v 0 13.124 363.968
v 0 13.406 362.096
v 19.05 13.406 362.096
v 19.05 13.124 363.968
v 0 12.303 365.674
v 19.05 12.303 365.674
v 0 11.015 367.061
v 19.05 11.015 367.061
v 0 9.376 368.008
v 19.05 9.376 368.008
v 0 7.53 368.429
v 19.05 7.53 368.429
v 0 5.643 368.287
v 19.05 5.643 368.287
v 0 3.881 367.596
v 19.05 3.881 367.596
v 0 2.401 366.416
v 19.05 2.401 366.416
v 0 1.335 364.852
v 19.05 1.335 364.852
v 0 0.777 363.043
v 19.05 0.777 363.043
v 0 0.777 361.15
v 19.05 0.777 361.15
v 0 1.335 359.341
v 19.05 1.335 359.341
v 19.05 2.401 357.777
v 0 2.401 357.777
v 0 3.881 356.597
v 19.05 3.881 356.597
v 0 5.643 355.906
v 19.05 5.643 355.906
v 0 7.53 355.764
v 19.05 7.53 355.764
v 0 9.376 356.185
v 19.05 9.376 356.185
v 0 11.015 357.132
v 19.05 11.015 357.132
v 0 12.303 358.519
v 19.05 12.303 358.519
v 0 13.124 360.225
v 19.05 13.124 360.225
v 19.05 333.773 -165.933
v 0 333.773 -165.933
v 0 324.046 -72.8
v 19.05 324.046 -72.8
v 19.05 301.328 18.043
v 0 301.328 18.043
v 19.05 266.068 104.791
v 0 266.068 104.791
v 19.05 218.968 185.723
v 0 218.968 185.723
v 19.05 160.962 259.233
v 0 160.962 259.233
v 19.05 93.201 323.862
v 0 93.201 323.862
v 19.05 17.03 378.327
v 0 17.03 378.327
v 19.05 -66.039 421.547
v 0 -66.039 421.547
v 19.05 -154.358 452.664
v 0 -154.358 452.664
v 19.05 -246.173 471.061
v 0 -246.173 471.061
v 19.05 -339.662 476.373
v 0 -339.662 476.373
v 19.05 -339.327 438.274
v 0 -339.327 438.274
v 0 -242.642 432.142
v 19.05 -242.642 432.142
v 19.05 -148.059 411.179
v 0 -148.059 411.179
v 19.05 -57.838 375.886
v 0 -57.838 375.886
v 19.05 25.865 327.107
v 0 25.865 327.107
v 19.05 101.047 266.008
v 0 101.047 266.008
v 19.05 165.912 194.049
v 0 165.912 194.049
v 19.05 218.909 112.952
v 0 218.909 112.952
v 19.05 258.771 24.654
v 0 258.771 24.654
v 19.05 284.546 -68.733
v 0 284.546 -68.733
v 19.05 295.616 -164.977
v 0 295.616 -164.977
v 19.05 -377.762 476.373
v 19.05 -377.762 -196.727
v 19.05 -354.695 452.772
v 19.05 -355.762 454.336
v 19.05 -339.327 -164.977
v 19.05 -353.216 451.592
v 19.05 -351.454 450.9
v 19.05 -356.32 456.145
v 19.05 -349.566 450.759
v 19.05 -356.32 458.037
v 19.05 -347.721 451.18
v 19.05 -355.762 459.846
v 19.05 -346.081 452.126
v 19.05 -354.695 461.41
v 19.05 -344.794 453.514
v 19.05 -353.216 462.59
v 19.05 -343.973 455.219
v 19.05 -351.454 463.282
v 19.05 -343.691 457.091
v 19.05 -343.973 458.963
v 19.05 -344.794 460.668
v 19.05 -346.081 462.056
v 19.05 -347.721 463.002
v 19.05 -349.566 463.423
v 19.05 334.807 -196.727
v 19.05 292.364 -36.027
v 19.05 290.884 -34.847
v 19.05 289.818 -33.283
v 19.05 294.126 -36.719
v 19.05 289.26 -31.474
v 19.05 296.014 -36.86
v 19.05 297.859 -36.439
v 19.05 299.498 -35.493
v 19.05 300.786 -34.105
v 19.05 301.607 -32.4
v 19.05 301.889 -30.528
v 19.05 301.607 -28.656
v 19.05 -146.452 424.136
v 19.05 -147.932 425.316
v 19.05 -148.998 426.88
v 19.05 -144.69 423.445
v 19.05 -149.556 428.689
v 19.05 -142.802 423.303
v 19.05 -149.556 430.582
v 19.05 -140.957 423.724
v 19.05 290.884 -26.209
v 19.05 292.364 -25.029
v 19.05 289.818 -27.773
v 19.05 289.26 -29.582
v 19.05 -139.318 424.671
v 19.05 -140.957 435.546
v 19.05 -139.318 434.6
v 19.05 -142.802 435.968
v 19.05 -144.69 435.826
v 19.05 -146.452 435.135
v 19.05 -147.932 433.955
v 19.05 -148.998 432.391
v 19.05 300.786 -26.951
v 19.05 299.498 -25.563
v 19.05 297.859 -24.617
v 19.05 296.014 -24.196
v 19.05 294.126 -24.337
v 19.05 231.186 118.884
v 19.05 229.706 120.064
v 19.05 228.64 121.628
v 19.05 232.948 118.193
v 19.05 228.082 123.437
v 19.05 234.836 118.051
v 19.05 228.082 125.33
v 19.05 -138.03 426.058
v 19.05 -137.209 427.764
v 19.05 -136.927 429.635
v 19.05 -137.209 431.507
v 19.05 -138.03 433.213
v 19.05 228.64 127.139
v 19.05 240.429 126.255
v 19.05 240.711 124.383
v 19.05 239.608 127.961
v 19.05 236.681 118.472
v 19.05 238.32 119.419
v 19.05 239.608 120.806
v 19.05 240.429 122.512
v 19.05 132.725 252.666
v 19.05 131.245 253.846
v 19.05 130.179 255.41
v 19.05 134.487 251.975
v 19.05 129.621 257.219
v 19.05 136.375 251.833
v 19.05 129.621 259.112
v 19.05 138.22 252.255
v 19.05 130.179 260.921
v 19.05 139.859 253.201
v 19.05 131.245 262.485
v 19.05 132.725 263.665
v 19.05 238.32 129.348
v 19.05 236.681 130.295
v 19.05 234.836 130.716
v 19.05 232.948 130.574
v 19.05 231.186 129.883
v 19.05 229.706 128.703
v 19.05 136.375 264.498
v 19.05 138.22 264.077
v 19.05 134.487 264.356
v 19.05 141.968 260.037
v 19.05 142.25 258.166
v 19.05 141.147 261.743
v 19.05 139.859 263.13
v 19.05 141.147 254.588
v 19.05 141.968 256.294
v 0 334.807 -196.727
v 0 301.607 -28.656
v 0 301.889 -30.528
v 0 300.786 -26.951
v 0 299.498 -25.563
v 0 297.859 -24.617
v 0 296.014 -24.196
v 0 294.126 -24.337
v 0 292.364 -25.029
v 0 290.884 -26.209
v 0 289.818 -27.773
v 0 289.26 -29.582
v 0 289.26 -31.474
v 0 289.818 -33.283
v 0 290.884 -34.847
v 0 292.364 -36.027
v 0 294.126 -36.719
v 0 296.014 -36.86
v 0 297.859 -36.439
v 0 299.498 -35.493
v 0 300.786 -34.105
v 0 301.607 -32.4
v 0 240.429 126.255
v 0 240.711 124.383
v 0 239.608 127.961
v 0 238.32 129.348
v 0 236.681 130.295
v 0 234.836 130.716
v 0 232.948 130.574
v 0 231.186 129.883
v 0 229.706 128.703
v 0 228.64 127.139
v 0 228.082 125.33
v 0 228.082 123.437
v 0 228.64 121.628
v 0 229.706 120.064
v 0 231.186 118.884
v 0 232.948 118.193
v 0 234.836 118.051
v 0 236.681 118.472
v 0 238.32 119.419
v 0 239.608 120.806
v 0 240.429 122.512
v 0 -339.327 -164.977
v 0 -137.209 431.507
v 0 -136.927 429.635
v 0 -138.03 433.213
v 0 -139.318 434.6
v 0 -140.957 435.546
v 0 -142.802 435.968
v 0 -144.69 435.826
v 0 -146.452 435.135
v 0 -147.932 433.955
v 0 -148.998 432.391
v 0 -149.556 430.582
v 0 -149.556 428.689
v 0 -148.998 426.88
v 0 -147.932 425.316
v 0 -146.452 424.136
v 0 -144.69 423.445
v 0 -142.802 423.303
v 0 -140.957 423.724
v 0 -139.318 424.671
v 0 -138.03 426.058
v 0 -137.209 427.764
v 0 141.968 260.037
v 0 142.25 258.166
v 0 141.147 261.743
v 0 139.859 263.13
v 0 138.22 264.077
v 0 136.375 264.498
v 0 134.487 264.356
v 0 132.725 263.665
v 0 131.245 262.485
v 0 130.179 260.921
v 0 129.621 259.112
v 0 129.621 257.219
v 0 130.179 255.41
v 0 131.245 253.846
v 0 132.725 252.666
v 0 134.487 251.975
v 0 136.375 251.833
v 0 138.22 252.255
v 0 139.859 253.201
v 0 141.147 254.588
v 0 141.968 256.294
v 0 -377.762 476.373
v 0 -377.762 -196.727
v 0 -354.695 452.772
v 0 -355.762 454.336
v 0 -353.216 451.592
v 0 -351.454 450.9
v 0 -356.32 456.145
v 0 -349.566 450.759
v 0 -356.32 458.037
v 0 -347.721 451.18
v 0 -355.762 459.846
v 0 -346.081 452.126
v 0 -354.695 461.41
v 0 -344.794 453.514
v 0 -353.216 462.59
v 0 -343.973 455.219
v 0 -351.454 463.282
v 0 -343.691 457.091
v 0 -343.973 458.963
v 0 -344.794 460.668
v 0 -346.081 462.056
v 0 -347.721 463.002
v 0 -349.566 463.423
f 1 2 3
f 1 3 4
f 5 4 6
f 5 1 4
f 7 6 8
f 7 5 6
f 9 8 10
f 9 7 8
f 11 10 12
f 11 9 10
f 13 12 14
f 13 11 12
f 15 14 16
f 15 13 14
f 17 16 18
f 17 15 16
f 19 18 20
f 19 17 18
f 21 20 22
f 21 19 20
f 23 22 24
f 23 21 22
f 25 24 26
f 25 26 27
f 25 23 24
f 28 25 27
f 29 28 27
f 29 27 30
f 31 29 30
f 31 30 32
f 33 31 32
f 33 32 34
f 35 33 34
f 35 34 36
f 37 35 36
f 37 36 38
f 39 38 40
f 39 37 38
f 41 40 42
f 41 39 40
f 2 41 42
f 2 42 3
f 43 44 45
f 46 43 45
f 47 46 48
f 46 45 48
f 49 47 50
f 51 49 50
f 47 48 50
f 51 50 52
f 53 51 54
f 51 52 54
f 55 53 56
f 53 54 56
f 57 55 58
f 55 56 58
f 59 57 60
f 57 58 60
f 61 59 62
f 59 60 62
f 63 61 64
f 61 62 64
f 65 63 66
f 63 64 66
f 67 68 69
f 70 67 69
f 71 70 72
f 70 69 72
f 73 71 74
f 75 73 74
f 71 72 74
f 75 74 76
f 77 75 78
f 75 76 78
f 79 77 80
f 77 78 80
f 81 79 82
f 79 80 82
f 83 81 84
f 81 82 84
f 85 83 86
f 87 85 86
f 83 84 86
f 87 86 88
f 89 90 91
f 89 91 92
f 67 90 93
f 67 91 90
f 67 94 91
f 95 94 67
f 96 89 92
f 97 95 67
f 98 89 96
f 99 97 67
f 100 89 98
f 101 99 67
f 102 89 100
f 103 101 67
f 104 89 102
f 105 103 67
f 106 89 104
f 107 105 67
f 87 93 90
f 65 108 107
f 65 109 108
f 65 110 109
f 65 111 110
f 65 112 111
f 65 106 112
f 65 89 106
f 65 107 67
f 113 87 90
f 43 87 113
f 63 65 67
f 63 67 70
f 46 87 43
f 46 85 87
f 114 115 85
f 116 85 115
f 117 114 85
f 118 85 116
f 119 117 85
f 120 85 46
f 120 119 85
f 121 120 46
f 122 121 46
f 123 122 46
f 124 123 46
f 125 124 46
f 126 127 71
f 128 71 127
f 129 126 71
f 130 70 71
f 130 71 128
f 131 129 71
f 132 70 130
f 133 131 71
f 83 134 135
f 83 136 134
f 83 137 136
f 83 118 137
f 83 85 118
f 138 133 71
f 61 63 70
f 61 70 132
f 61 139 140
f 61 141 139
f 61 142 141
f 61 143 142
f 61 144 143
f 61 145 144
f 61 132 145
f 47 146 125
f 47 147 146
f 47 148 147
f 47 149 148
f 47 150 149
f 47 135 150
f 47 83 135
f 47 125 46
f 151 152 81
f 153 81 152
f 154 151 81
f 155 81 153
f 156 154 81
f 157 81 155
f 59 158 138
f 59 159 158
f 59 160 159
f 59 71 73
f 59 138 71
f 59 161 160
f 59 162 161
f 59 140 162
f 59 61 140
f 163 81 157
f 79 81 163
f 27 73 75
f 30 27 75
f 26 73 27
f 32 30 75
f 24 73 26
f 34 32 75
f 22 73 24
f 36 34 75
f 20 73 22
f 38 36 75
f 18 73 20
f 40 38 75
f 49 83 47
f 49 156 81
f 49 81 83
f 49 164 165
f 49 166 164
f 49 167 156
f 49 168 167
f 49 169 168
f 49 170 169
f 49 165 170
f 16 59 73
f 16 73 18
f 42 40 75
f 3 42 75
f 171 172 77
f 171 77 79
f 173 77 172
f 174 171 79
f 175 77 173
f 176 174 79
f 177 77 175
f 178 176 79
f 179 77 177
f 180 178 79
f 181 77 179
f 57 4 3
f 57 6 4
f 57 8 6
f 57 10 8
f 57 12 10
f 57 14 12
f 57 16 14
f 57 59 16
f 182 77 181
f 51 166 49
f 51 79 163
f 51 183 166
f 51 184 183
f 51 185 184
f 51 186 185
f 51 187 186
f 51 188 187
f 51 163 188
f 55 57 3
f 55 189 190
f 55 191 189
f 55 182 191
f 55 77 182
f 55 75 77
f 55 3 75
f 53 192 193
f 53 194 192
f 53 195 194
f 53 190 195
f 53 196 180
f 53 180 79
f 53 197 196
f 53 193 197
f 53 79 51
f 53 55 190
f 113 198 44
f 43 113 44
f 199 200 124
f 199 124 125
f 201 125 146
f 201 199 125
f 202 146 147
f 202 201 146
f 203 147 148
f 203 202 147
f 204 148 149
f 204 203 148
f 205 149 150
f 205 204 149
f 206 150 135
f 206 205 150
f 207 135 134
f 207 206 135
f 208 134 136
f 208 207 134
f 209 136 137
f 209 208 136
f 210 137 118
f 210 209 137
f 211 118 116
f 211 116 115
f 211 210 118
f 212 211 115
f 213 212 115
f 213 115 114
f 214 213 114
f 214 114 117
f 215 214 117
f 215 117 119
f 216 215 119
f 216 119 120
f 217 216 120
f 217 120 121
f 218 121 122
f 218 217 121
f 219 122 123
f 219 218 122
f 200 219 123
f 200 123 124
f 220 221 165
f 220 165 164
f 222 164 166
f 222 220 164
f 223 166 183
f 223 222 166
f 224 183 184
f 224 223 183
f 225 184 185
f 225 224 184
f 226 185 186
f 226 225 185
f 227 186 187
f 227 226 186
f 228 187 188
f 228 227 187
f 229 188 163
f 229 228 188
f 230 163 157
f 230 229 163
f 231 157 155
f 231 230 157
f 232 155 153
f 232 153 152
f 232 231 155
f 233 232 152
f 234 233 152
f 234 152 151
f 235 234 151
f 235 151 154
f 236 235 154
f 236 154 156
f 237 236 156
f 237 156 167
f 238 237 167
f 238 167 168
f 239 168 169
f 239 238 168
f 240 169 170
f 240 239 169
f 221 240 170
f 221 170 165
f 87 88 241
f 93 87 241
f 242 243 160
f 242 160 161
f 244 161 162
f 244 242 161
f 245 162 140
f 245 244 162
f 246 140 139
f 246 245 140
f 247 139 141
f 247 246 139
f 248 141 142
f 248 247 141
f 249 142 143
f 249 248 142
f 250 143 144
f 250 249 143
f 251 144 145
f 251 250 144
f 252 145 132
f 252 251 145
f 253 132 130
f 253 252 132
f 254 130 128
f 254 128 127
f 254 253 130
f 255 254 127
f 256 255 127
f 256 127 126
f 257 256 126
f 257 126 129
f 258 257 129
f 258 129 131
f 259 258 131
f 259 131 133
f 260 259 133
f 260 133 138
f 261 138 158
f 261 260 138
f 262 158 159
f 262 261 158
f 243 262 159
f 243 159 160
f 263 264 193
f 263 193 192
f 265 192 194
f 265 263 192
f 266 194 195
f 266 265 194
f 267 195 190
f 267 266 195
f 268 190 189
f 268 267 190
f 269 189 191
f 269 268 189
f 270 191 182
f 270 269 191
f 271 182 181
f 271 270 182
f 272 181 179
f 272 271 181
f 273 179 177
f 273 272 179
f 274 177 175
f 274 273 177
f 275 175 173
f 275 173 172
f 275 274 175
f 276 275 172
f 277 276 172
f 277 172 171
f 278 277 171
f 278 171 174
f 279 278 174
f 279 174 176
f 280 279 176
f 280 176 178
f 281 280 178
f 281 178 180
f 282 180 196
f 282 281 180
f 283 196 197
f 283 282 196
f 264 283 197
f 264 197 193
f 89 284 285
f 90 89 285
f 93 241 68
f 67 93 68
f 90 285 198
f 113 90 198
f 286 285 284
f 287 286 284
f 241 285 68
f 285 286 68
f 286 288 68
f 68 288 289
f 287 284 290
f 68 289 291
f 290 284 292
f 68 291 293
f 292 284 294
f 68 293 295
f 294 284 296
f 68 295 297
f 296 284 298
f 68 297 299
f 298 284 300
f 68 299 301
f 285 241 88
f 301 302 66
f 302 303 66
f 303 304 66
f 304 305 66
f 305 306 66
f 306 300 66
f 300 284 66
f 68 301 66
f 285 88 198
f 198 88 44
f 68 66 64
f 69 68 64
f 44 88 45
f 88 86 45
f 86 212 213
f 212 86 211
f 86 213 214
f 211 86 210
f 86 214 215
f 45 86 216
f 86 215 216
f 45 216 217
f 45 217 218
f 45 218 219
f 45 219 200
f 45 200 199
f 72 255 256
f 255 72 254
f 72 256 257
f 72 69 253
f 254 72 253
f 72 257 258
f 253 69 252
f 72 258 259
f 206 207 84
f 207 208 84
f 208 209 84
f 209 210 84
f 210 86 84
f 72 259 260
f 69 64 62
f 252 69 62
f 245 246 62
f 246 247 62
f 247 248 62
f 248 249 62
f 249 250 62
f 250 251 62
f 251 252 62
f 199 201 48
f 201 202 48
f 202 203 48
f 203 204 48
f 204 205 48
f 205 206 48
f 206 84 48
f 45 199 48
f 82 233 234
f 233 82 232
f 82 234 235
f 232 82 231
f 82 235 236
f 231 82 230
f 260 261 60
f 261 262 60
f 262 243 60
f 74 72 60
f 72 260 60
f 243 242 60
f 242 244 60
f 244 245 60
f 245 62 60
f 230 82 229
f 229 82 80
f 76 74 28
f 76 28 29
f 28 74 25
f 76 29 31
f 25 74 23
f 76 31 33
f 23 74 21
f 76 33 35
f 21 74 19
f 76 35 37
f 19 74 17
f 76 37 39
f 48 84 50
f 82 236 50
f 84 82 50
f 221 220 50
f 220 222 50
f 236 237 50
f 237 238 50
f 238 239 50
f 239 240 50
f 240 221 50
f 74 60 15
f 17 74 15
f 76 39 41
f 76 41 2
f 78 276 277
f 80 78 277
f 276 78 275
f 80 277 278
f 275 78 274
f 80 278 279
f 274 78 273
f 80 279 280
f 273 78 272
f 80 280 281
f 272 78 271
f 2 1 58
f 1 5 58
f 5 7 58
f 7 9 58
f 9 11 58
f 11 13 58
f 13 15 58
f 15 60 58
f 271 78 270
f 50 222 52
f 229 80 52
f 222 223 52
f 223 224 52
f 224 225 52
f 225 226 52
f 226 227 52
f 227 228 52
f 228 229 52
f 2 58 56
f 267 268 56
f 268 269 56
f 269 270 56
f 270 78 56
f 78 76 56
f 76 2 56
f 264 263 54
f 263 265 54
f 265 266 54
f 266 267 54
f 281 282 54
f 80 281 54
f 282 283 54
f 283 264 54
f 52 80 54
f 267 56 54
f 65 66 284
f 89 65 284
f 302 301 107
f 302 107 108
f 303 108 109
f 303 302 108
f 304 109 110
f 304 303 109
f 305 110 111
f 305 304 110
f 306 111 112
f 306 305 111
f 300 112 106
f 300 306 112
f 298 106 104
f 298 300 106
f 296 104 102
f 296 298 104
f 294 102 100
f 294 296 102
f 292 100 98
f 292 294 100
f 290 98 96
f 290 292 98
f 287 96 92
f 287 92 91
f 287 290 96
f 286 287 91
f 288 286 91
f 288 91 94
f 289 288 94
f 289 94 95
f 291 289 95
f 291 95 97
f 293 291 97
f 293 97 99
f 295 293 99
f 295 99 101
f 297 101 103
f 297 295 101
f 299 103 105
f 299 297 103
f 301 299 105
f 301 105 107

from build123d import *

# Parameters (mm, degrees)
F0_R     = 6.35
F1_DEPTH = 19.05


with BuildPart() as f1:
    # F0 (on Right) → F1 (new body)
    with BuildSketch(Plane.YZ):
        with BuildLine():
            Line((334.807445, -196.726841), (333.773435, -165.933012))
            ThreePointArc((333.773435, -165.933012), (128.220826, 292.742264), (-339.662255, 476.373159))
            Line((-339.662255, 476.373159), (-377.762255, 476.373159))
            Line((-377.762255, 476.373159), (-377.762255, -196.726841))
            Line((-377.762255, -196.726841), (314.387745, -196.726841))
            Line((314.387745, -196.726841), (334.807445, -196.726841))
        make_face()
        with BuildLine():
            ThreePointArc((-339.326565, 438.274146), (101.046912, 266.007515), (295.615862, -164.976841))
            Line((295.615862, -164.976841), (-339.326565, -164.976841))
            Line((-339.326565, -164.976841), (-339.326565, 438.274146))
        make_face(mode=Mode.SUBTRACT)
        with Locations((295.538976, -30.528007)):
            Circle(F0_R, mode=Mode.SUBTRACT)
        with Locations((234.36105, 124.383493)):
            Circle(F0_R, mode=Mode.SUBTRACT)
        with Locations((-350.040551, 457.090986)):
            Circle(F0_R, mode=Mode.SUBTRACT)
        with Locations((-143.276888, 429.635451)):
            Circle(F0_R, mode=Mode.SUBTRACT)
        with Locations((135.900178, 258.16555)):
            Circle(F0_R, mode=Mode.SUBTRACT)
        with Locations((7.055922, 362.096482)):
            Circle(F0_R, mode=Mode.SUBTRACT)
    extrude(amount=F1_DEPTH)


solid = f1.part
